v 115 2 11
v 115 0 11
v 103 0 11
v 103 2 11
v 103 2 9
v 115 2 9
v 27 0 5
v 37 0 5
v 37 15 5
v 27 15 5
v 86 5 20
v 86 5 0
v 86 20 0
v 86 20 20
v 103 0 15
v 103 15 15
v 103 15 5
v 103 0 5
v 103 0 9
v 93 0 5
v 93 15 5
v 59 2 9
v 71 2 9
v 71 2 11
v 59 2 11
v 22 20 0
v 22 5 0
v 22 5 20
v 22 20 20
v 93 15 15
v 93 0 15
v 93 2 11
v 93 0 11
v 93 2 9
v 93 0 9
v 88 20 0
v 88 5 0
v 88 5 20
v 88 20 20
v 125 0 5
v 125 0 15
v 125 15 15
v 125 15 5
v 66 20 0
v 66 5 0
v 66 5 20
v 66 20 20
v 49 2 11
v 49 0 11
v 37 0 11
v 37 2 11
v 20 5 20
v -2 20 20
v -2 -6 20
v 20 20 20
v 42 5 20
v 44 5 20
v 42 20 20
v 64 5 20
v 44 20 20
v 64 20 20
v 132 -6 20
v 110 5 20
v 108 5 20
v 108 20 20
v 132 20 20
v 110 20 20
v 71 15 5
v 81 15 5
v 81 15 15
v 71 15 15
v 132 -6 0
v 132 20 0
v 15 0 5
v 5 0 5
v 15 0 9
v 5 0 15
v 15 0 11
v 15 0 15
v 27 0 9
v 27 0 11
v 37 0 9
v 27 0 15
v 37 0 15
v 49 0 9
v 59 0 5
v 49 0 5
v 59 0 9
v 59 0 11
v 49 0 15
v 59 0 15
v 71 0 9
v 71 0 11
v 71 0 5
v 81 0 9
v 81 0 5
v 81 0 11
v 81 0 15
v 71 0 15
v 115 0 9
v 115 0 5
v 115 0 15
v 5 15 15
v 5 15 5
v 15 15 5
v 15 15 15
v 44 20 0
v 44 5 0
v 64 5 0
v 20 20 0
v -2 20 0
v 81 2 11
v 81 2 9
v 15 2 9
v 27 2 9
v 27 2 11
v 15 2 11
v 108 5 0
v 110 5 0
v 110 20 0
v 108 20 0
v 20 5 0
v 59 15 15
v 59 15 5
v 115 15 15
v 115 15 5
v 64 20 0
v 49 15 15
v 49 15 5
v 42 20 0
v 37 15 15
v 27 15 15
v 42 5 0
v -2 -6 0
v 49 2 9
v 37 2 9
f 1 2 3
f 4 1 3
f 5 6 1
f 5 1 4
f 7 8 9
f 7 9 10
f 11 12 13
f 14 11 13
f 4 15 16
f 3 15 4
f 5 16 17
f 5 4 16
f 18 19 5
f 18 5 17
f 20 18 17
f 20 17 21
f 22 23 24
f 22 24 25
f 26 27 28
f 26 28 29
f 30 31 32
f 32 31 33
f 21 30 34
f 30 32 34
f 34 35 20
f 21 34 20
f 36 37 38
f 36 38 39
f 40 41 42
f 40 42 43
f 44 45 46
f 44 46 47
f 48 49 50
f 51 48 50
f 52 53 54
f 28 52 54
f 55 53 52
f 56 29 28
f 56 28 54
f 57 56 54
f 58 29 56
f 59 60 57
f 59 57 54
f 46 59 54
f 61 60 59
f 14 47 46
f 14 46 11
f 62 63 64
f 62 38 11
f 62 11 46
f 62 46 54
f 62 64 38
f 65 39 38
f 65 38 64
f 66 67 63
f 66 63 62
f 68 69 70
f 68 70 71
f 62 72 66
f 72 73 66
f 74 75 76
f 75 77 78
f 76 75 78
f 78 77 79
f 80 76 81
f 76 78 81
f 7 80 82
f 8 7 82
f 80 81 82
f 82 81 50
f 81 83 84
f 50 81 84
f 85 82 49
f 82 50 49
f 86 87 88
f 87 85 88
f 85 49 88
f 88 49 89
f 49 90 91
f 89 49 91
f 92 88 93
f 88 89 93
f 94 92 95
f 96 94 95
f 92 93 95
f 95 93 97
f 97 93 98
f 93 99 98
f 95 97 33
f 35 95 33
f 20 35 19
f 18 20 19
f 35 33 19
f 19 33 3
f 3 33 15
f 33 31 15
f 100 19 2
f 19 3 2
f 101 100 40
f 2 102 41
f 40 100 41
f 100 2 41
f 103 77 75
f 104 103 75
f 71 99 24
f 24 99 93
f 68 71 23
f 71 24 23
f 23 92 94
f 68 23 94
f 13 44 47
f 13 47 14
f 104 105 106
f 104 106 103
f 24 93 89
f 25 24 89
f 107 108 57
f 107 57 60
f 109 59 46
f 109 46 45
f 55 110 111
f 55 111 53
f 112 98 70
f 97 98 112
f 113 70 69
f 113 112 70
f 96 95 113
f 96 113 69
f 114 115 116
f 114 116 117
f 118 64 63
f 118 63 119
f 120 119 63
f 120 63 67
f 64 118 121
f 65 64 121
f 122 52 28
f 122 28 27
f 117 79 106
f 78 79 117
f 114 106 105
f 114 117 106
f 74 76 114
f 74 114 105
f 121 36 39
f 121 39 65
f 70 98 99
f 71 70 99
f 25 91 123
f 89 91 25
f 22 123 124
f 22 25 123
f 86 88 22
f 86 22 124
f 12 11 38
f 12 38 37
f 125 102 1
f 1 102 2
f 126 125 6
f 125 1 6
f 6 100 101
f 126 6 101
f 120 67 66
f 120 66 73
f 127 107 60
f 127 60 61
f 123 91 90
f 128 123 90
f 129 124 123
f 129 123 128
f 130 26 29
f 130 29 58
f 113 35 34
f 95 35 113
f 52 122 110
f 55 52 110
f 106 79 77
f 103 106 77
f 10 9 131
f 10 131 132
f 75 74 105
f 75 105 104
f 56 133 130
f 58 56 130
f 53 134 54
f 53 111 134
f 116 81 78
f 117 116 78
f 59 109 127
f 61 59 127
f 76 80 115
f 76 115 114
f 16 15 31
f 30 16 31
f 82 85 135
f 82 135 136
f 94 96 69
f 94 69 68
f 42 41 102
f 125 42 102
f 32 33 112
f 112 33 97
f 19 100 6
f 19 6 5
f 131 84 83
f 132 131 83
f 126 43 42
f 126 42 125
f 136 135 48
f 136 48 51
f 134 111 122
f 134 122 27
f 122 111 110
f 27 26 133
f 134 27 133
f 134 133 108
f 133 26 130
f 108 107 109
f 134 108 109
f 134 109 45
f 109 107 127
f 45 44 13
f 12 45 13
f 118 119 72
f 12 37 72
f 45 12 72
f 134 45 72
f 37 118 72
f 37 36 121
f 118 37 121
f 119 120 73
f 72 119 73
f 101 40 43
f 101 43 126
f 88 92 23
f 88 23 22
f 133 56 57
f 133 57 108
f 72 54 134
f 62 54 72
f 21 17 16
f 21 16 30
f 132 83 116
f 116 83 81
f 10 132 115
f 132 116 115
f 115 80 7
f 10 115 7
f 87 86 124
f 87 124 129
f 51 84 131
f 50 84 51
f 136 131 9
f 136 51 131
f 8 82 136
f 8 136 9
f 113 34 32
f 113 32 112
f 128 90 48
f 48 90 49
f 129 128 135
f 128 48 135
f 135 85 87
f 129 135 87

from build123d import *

# Parameters (mm, degrees)
SKETCH1_W           = 20
SKETCH1_H           = 20
BOSS_EXTRUDE1_DEPTH = 20
SKETCH2_W           = 10
SKETCH2_H           = 10
CUT_EXTRUDE1_DEPTH  = 15
SKETCH3_W           = 20
SKETCH3_H           = 5
BOSS_EXTRUDE2_DEPTH = 2
LPATTERN1_COUNT     = 6
LPATTERN1_PITCH     = 22
SKETCH4_W           = 20
SKETCH4_H           = 15
BOSS_EXTRUDE3_DEPTH = 2
SKETCH5_W           = 20
SKETCH5_H           = 20
BOSS_EXTRUDE5_DEPTH = 2
SKETCH7_W           = 120
SKETCH7_H           = 2
CUT_EXTRUDE2_DEPTH  = 2
SKETCH8_W           = 134
SKETCH8_H           = 20
BOSS_EXTRUDE6_DEPTH = 6


with BuildPart() as part:
    # Sketch1 → Boss-Extrude1 (new body)
    with BuildSketch(Plane.XY):
        with Locations((10, 10)):
            Rectangle(SKETCH1_W, SKETCH1_H)
    extrude(amount=BOSS_EXTRUDE1_DEPTH)

    # Sketch2 → Cut-Extrude1 (cut)
    with BuildSketch(Plane(origin=(0, 0, 0), x_dir=(-1, 0, 0), z_dir=(0, -1, 0))):
        with Locations((-10, -10)):
            Rectangle(SKETCH2_W, SKETCH2_H)
    extrude(amount=-CUT_EXTRUDE1_DEPTH, mode=Mode.SUBTRACT)

    # Sketch3 → Boss-Extrude2 (add)
    with BuildSketch(Plane(origin=(20, 0, 0), x_dir=(0, 0, -1), z_dir=(1, 0, 0))):
        with Locations((-10, 2.5)):
            Rectangle(SKETCH3_W, SKETCH3_H)
    extrude(amount=BOSS_EXTRUDE2_DEPTH)


with BuildPart() as lpattern1_1:
    # LPattern1: pattern copy
    add(part.part.moved(Location(Vector(1, 0, 0) * (1 * LPATTERN1_PITCH))))


with BuildPart() as lpattern1_2:
    # LPattern1: pattern copy
    add(part.part.moved(Location(Vector(1, 0, 0) * (2 * LPATTERN1_PITCH))))


with BuildPart() as lpattern1_3:
    # LPattern1: pattern copy
    add(part.part.moved(Location(Vector(1, 0, 0) * (3 * LPATTERN1_PITCH))))


with BuildPart() as lpattern1_4:
    # LPattern1: pattern copy
    add(part.part.moved(Location(Vector(1, 0, 0) * (4 * LPATTERN1_PITCH))))


with BuildPart() as lpattern1_5:
    # LPattern1: pattern copy
    add(part.part.moved(Location(Vector(1, 0, 0) * (5 * LPATTERN1_PITCH))))


with BuildPart() as lpattern1_1_1:
    add(lpattern1_1.part)

    # Combine1: union LPattern1_2, LPattern1_3, part, LPattern1_4, LPattern1_5
    add(lpattern1_2.part)
    add(lpattern1_3.part)
    add(part.part)
    add(lpattern1_4.part)
    add(lpattern1_5.part)

    # Sketch4 → Boss-Extrude3 (add)
    with BuildSketch(Plane(origin=(130, 0, 0), x_dir=(0, 0, -1), z_dir=(1, 0, 0))):
        with Locations((-10, 12.5)):
            Rectangle(SKETCH4_W, SKETCH4_H)
    extrude(amount=BOSS_EXTRUDE3_DEPTH)

    # Sketch5 → Boss-Extrude5 (add)
    with BuildSketch(Plane.ZY):
        with Locations((10, 10)):
            Rectangle(SKETCH5_W, SKETCH5_H)
    extrude(amount=BOSS_EXTRUDE5_DEPTH)

    # Sketch7 → Cut-Extrude2 (cut)
    with BuildSketch(Plane(origin=(0, 0, 0), x_dir=(-1, 0, 0), z_dir=(0, -1, 0))):
        with Locations((-65, -10)):
            Rectangle(SKETCH7_W, SKETCH7_H)
    extrude(amount=-CUT_EXTRUDE2_DEPTH, mode=Mode.SUBTRACT)

    # Sketch8 → Boss-Extrude6 (add)
    with BuildSketch(Plane.XZ):
        with Locations((65, 10)):
            Rectangle(SKETCH8_W, SKETCH8_H)
    extrude(amount=BOSS_EXTRUDE6_DEPTH)


solid = lpattern1_1_1.part
